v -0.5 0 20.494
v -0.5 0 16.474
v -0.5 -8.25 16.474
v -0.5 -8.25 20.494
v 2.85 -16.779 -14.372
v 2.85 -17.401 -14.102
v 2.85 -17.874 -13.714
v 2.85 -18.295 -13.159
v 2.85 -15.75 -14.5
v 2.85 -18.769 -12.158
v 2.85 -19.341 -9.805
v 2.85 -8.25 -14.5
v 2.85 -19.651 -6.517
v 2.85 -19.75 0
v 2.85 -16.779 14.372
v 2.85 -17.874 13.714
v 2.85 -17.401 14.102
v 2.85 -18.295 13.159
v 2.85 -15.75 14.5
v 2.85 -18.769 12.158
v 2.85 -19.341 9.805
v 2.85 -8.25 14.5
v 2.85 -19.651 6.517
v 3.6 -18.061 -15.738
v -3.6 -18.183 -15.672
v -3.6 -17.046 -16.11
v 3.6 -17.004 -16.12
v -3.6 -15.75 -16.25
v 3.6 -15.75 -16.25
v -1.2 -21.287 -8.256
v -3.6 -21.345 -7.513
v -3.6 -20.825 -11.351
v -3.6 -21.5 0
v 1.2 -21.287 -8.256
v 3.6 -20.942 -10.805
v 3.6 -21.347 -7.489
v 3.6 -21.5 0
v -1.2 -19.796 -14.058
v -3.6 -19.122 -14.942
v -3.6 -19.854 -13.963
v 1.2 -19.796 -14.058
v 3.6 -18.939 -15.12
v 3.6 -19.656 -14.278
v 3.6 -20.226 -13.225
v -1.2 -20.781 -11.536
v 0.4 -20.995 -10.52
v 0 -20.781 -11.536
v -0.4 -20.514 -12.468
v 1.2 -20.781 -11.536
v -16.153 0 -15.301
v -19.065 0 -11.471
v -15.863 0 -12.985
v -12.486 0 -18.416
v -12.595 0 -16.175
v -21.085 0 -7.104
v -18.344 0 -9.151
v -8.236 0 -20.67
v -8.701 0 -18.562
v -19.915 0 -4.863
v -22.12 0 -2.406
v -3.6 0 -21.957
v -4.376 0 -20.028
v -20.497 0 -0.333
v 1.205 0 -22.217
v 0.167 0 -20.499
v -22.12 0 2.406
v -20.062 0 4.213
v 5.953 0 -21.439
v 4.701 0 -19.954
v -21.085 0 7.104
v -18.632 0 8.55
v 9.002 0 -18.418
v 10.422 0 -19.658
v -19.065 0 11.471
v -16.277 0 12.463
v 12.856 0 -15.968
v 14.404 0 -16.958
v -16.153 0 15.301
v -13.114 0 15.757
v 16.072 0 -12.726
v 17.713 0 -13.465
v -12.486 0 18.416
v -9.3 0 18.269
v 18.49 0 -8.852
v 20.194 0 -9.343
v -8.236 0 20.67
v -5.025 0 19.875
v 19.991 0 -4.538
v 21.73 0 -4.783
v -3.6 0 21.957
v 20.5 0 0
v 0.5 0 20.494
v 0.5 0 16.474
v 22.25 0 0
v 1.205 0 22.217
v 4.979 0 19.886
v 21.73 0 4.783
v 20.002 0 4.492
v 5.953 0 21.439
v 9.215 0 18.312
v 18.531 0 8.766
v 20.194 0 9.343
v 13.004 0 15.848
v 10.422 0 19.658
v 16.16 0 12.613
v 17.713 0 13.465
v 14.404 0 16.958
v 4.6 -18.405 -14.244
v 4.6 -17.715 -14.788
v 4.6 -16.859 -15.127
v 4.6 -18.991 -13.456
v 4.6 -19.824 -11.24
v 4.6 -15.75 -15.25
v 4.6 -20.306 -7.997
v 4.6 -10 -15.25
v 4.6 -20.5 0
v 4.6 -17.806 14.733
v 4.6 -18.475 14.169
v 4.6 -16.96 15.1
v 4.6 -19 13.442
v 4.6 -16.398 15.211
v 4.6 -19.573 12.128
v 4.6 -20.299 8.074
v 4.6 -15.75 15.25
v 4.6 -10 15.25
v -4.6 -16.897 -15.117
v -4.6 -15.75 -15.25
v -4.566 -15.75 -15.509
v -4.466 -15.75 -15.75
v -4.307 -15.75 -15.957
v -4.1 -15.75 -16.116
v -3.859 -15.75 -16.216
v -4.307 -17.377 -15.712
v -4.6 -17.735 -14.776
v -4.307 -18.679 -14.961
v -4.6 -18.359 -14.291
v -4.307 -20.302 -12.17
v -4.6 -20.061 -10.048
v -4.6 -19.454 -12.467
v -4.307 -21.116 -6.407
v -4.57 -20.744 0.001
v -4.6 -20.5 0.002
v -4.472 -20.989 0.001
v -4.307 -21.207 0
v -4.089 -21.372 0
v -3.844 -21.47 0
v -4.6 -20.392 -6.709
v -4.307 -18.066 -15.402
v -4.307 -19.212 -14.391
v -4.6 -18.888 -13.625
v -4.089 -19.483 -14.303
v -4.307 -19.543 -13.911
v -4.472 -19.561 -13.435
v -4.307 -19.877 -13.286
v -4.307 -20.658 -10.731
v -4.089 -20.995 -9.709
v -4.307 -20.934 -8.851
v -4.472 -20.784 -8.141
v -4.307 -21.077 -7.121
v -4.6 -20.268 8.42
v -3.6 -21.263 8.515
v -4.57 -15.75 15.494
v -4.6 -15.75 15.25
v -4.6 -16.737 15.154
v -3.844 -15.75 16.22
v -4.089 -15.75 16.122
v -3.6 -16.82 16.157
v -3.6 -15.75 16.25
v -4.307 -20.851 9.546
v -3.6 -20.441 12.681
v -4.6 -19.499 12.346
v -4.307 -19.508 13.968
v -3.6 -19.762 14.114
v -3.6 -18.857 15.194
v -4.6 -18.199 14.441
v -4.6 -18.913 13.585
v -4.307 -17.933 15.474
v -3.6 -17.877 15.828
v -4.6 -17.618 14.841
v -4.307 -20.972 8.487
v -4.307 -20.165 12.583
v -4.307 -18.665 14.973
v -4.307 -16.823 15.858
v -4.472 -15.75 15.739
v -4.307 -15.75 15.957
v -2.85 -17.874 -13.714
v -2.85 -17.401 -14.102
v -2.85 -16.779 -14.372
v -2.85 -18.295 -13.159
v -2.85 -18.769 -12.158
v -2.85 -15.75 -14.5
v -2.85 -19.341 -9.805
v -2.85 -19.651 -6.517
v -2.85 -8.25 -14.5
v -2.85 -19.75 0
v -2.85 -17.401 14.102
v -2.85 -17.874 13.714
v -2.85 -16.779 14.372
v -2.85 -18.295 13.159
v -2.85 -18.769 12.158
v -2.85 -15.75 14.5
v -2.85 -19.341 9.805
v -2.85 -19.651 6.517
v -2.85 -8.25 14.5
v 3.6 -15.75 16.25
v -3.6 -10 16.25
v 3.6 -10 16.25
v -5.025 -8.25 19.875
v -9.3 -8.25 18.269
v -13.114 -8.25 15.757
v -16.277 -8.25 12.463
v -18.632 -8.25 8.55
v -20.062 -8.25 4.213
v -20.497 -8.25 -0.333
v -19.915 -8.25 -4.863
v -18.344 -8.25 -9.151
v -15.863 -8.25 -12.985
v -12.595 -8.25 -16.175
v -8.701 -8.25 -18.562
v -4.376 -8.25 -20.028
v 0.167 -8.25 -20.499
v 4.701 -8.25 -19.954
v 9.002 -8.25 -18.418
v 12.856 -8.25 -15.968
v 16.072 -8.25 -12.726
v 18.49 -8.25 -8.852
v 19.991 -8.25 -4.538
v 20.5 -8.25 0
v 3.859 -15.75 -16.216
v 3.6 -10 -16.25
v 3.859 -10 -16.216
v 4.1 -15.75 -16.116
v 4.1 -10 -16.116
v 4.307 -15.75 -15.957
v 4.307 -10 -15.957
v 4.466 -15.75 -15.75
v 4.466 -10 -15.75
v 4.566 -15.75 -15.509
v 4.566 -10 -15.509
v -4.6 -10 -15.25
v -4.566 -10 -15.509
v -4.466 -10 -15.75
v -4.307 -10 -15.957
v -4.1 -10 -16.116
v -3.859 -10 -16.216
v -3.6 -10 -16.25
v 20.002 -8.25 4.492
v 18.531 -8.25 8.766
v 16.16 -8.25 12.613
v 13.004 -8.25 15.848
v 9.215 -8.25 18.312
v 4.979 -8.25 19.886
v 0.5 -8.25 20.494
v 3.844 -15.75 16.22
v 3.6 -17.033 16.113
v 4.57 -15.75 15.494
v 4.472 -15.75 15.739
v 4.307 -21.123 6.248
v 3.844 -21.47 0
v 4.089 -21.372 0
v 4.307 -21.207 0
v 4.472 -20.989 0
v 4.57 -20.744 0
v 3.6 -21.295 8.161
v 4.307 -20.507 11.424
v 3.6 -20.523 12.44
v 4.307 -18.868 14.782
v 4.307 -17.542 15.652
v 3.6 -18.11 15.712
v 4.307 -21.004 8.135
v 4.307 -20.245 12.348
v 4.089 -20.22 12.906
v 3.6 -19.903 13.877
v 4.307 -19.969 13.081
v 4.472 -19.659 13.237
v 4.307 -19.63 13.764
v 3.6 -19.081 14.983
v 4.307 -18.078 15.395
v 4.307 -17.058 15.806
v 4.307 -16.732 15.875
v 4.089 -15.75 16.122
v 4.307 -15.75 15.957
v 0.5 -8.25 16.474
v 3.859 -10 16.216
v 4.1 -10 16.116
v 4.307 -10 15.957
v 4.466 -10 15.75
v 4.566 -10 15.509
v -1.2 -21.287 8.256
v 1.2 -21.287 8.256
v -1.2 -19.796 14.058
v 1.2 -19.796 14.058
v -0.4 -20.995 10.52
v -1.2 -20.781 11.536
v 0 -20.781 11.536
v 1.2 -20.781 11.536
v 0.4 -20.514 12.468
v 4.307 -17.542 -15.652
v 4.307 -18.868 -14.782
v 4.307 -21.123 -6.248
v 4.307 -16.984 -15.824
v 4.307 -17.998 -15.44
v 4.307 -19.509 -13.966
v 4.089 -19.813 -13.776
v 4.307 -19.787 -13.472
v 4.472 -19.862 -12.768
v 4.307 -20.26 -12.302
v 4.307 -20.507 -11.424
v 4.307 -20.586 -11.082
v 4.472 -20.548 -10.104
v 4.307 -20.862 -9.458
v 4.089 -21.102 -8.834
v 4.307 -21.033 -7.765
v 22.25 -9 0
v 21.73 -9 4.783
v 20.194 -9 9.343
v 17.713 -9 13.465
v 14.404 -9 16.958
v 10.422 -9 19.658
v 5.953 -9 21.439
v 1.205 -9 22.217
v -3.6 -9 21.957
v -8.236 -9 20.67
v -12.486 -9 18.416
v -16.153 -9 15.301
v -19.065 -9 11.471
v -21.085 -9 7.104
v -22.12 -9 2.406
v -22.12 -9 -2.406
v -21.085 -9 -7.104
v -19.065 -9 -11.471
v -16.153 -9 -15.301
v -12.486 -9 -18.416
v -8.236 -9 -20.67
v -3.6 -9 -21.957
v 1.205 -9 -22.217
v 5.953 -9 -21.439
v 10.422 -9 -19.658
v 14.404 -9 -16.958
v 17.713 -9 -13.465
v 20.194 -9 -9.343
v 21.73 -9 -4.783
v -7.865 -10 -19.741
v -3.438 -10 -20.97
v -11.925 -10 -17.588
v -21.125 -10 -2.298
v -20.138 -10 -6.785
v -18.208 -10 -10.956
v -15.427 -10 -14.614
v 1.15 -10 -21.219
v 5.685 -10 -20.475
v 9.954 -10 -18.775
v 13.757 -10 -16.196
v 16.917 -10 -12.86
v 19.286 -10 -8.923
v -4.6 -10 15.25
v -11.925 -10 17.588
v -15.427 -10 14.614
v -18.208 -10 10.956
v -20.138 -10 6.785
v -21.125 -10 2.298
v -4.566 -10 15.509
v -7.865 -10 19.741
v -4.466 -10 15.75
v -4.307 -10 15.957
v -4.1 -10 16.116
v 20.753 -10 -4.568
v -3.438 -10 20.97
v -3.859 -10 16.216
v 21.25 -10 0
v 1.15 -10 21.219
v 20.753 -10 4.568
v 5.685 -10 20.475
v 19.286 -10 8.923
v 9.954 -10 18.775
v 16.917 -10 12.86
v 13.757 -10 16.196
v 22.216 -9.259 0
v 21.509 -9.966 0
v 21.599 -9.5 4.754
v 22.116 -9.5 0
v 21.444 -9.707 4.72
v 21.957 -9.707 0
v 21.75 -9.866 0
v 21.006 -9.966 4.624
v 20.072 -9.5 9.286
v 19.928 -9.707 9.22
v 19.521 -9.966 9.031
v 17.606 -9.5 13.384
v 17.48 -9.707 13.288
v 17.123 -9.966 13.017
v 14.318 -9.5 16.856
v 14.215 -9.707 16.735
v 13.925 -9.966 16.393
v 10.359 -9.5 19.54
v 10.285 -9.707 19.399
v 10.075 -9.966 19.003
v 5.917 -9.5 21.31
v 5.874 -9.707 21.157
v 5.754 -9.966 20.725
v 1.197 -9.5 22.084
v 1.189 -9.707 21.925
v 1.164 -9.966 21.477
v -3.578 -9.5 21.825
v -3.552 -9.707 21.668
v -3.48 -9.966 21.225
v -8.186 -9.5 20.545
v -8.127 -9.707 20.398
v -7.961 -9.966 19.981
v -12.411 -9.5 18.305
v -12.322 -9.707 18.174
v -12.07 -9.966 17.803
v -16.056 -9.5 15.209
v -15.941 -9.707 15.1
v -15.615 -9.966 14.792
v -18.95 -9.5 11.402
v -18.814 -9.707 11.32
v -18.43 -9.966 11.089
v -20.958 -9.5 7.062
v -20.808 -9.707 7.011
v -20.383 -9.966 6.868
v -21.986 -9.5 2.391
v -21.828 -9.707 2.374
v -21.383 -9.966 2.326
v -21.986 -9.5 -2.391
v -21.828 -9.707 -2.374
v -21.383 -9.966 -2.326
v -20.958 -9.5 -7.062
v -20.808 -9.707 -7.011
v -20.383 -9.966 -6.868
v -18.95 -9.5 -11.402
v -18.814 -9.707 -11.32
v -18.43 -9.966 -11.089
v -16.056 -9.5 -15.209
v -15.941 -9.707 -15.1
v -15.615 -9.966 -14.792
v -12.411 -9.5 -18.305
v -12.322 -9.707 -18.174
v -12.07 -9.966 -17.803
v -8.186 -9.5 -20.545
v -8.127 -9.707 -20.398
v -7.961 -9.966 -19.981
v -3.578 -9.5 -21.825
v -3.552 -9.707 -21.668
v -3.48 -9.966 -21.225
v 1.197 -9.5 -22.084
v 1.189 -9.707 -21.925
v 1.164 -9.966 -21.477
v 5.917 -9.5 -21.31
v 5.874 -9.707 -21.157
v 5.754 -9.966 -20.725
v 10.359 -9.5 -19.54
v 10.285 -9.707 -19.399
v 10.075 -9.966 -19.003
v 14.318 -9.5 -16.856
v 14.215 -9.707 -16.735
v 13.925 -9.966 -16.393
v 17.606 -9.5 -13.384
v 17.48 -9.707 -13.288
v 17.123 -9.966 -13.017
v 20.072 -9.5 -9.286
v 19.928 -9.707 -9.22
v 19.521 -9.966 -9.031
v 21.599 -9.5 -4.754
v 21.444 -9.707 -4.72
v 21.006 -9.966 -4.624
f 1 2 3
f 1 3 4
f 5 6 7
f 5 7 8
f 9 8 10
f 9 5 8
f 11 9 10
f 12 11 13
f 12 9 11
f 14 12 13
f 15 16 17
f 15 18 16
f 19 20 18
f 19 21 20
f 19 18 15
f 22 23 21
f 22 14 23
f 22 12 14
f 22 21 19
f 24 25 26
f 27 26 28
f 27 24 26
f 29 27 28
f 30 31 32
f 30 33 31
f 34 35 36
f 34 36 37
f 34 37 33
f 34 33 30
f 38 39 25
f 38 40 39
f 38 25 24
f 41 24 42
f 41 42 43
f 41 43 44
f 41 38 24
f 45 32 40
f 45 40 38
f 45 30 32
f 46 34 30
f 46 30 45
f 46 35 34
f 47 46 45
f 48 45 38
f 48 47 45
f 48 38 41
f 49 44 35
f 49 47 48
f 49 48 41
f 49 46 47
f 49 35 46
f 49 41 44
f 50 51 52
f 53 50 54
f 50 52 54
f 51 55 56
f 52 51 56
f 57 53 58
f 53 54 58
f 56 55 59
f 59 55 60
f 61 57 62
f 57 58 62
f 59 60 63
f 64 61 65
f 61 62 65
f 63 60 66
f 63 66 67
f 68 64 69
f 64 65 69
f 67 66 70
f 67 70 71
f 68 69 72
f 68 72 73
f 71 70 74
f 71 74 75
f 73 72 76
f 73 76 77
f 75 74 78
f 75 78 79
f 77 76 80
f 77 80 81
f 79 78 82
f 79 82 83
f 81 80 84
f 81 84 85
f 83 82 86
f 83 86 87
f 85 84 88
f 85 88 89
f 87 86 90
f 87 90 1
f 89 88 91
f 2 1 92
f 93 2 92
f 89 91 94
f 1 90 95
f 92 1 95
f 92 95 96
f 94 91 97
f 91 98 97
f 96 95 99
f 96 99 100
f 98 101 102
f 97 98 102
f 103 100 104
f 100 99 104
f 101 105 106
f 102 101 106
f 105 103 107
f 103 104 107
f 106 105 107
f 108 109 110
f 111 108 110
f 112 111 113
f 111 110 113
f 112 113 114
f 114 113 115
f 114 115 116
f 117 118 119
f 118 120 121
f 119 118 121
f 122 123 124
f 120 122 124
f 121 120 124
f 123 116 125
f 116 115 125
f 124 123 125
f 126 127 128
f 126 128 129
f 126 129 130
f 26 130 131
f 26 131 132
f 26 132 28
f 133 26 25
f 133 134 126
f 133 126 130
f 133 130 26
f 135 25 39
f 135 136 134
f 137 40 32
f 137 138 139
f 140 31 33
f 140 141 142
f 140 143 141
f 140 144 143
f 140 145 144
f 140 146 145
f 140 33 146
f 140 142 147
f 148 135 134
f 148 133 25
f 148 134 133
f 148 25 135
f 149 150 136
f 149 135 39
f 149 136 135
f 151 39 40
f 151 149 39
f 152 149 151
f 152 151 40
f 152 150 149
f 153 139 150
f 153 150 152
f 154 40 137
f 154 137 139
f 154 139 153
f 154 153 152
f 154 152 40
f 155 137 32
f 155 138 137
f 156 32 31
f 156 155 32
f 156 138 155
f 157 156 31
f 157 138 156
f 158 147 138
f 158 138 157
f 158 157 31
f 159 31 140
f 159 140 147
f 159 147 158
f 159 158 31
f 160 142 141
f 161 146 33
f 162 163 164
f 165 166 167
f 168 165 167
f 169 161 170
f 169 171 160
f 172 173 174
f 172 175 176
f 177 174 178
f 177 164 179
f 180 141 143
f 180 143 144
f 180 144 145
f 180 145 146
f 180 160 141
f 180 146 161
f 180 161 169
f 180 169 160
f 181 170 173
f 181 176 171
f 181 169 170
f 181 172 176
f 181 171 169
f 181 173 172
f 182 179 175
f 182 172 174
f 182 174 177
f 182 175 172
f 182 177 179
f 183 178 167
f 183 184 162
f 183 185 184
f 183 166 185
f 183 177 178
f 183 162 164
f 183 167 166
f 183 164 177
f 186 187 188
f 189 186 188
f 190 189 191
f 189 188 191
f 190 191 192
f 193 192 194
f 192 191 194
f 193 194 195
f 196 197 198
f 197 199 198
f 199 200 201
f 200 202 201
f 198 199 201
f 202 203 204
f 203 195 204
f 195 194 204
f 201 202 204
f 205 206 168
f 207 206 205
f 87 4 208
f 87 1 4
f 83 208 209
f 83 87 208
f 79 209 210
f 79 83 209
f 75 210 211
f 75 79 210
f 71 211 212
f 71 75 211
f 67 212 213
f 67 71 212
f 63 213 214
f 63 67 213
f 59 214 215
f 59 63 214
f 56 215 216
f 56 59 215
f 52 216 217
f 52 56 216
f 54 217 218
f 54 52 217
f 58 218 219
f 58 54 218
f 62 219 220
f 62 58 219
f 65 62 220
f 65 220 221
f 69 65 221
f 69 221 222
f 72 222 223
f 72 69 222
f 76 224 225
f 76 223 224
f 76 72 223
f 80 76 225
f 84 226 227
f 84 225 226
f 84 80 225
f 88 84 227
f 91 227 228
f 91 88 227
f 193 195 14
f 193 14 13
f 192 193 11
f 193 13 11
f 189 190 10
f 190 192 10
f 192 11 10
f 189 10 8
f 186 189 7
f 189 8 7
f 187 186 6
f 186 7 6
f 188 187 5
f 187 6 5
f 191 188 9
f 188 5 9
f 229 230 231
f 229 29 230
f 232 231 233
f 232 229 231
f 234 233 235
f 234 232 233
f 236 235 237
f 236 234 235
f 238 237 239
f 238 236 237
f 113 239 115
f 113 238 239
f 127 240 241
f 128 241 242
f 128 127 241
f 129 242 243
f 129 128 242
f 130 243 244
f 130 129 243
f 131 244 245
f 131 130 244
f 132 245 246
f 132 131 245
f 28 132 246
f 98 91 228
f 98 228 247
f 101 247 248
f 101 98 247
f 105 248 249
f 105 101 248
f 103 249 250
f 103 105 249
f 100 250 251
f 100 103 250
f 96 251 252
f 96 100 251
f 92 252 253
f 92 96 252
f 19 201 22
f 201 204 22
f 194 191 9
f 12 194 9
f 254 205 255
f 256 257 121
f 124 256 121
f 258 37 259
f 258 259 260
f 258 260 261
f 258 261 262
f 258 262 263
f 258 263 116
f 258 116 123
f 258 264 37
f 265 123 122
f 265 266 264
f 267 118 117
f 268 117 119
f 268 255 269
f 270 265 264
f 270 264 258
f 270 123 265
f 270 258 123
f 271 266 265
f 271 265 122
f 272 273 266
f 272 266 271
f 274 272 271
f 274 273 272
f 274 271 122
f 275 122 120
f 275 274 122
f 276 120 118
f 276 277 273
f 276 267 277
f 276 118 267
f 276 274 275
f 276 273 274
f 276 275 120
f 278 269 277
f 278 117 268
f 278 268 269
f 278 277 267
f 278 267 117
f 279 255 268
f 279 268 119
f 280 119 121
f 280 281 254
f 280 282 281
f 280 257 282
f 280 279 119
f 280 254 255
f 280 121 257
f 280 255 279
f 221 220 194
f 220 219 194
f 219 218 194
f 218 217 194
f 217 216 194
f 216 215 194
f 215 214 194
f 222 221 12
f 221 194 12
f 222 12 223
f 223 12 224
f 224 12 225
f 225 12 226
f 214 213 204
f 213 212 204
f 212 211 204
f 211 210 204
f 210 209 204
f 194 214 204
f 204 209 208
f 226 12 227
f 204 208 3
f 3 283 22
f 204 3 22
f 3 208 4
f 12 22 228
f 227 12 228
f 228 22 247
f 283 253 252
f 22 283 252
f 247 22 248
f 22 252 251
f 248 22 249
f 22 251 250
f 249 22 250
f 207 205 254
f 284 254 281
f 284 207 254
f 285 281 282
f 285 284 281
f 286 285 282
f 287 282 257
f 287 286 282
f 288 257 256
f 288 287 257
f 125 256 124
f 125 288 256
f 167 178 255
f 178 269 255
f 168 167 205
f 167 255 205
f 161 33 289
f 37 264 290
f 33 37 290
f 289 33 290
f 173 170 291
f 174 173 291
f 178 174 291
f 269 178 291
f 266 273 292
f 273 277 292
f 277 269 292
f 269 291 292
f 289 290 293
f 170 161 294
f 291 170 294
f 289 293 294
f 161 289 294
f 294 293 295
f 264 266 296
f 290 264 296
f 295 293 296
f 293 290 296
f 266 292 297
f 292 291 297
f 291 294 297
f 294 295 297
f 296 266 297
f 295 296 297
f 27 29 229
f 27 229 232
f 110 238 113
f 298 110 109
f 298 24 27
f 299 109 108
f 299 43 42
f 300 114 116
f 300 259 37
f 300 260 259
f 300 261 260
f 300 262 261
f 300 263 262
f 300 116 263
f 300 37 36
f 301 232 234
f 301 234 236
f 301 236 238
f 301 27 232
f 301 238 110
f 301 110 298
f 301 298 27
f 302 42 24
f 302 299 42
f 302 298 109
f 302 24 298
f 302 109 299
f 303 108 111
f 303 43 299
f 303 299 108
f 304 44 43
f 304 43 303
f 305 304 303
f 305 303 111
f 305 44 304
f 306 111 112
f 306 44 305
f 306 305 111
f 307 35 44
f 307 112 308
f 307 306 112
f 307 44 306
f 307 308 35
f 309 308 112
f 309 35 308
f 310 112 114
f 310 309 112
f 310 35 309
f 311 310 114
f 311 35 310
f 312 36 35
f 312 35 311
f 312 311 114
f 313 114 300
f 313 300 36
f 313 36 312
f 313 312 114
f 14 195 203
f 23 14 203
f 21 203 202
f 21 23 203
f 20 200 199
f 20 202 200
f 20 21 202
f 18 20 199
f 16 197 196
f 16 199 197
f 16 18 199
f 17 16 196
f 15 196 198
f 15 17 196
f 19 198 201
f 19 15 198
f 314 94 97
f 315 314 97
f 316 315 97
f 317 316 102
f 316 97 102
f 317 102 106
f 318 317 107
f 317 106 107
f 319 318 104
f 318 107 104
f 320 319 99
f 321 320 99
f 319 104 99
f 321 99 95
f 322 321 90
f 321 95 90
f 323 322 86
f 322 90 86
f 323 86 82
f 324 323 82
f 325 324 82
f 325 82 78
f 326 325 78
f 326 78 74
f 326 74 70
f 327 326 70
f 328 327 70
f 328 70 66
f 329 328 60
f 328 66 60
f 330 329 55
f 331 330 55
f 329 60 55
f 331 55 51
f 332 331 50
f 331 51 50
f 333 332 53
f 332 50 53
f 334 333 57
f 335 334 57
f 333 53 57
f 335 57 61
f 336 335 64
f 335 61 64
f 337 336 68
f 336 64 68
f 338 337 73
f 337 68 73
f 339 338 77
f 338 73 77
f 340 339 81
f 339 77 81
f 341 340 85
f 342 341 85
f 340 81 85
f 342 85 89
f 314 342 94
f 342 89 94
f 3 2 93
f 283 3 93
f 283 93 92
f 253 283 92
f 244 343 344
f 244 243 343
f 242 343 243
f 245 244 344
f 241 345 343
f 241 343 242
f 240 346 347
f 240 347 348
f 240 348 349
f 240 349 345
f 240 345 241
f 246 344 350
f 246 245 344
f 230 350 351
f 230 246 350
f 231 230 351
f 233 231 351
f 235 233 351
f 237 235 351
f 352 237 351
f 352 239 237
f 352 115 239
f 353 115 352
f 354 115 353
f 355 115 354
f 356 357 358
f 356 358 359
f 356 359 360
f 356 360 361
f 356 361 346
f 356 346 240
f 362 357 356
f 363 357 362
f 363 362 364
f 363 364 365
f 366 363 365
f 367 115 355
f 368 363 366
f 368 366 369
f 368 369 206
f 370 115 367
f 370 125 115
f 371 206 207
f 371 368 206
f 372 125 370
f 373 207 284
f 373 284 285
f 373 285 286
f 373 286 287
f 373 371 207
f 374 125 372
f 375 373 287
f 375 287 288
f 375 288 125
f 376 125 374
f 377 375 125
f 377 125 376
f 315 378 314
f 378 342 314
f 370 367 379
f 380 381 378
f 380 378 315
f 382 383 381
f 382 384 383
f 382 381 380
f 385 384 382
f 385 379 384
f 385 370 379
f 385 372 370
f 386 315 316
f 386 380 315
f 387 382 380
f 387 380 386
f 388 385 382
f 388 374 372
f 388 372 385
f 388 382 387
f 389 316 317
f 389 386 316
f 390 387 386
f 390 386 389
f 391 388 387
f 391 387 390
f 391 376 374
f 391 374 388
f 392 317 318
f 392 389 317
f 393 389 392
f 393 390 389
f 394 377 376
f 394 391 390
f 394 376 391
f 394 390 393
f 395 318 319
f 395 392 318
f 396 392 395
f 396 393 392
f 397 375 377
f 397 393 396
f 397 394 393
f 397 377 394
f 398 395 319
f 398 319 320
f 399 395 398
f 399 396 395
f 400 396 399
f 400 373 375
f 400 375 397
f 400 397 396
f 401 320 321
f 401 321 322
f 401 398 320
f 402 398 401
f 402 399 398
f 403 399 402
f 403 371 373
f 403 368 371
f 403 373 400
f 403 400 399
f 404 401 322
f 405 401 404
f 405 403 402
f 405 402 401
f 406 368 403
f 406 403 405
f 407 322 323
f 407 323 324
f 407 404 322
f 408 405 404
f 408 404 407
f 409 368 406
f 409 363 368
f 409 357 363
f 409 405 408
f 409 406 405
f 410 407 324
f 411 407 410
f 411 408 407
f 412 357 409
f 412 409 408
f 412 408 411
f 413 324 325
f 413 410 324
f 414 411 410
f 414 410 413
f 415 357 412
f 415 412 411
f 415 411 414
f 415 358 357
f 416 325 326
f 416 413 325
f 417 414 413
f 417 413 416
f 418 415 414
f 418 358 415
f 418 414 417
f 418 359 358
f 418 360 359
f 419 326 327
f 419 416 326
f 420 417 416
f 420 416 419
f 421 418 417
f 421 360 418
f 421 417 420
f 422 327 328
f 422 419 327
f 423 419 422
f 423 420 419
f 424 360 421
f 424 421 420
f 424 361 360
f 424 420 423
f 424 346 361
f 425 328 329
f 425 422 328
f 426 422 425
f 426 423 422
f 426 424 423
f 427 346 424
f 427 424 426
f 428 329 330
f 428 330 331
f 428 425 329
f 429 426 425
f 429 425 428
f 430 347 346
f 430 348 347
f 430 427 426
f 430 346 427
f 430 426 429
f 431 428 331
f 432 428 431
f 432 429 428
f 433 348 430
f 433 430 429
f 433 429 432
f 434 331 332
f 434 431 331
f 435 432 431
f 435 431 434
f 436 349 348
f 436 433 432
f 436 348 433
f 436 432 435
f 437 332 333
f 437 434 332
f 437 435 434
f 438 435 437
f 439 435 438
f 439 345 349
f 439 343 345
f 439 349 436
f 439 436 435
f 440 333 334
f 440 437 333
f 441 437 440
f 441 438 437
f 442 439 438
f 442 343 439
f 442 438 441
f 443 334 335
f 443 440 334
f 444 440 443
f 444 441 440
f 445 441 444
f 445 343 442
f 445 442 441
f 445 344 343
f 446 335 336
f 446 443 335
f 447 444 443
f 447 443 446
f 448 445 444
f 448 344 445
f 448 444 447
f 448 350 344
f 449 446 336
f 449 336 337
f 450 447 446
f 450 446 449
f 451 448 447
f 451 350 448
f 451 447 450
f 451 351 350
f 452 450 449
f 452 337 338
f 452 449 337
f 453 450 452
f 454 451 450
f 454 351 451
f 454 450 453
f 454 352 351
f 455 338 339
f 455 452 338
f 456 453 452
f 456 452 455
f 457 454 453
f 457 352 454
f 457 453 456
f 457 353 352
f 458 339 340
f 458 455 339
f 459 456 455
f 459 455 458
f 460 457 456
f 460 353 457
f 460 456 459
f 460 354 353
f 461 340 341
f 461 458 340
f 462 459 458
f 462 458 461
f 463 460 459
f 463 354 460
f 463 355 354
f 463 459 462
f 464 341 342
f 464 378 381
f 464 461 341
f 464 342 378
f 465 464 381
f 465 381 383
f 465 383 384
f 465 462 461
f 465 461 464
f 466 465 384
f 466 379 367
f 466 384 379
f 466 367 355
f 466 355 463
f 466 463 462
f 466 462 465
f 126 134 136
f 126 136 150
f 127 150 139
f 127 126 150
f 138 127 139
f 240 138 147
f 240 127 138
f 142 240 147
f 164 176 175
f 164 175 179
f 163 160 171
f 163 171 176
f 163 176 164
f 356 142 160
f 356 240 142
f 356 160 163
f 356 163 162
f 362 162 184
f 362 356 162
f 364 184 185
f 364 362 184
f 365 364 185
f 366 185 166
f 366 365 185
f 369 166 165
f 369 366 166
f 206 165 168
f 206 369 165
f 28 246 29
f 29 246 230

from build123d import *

# Parameters (mm, degrees)
F0_R     = 22.25
F1_DEPTH = 10
F2_W     = 9.2
F2_H     = 32.5
F3_DEPTH = 11.5
F5_DEPTH = 10
F6_R     = 1
F7_T     = -1.75
F8_W     = 1
F8_H     = 4.1
F9_DEPTH = 10
F10_R    = 1


with BuildPart() as f1:
    # F0 (on Front) → F1 (new body)
    with BuildSketch(Plane.XZ):
        Circle(F0_R)
    extrude(amount=F1_DEPTH)

    # F2 (on face) → F3 (join)
    with BuildSketch(Plane.XZ.offset(10)):
        Rectangle(F2_W, F2_H)
    extrude(amount=F3_DEPTH)

    # F4 (on face) → F5 (cut)
    with BuildSketch(Plane.YZ.offset(4.6)):
        with BuildLine():
            Line((-21.5, 16.25), (-21.5, 0))
            add(Edge.make_bspline(
                [(-21.5, 0), (-21.5, 9.096233188), (-21.5, 16.25), (-15.75, 16.25)],
                knots=[0, 0, 0, 0, 17.2373141759, 17.2373141759, 17.2373141759, 17.2373141759], degree=3))
            Line((-15.75, 16.25), (-21.5, 16.25))
        make_face()
        with BuildLine():
            add(Edge.make_bspline(
                [(-21.5, 0), (-21.5, -9.096233188), (-21.5, -16.25), (-15.75, -16.25)],
                knots=[0, 0, 0, 0, 17.2373141759, 17.2373141759, 17.2373141759, 17.2373141759], degree=3))
            Line((-21.5, 0), (-21.5, -16.25))
            Line((-21.5, -16.25), (-15.75, -16.25))
        make_face()
    extrude(amount=-F5_DEPTH, mode=Mode.SUBTRACT)

    # F6
    f6_edges = [f1.edges().sort_by_distance(p)[0] for p in [
        (4.6, -12.875, -16.25),
        (-4.6, -21.14469, -9.555694),
    ]]
    fillet(f6_edges, radius=F6_R)

    # F7
    f7_openings = [f1.faces().sort_by_distance(p)[0] for p in [
        (0, 0, 0),
    ]]
    offset(amount=F7_T, openings=f7_openings, kind=Kind.INTERSECTION)

    # F8 (on Front) → F9 (join)
    with BuildSketch(Plane.XZ):
        with Locations((0, 18.524242565)):
            Rectangle(F8_W, F8_H)
    extrude(amount=F9_DEPTH)

    # F10
    f10_edges = [f1.edges().sort_by_distance(p)[0] for p in [
        (-22.25, -10, 0),
    ]]
    fillet(f10_edges, radius=F10_R)


solid = f1.part
